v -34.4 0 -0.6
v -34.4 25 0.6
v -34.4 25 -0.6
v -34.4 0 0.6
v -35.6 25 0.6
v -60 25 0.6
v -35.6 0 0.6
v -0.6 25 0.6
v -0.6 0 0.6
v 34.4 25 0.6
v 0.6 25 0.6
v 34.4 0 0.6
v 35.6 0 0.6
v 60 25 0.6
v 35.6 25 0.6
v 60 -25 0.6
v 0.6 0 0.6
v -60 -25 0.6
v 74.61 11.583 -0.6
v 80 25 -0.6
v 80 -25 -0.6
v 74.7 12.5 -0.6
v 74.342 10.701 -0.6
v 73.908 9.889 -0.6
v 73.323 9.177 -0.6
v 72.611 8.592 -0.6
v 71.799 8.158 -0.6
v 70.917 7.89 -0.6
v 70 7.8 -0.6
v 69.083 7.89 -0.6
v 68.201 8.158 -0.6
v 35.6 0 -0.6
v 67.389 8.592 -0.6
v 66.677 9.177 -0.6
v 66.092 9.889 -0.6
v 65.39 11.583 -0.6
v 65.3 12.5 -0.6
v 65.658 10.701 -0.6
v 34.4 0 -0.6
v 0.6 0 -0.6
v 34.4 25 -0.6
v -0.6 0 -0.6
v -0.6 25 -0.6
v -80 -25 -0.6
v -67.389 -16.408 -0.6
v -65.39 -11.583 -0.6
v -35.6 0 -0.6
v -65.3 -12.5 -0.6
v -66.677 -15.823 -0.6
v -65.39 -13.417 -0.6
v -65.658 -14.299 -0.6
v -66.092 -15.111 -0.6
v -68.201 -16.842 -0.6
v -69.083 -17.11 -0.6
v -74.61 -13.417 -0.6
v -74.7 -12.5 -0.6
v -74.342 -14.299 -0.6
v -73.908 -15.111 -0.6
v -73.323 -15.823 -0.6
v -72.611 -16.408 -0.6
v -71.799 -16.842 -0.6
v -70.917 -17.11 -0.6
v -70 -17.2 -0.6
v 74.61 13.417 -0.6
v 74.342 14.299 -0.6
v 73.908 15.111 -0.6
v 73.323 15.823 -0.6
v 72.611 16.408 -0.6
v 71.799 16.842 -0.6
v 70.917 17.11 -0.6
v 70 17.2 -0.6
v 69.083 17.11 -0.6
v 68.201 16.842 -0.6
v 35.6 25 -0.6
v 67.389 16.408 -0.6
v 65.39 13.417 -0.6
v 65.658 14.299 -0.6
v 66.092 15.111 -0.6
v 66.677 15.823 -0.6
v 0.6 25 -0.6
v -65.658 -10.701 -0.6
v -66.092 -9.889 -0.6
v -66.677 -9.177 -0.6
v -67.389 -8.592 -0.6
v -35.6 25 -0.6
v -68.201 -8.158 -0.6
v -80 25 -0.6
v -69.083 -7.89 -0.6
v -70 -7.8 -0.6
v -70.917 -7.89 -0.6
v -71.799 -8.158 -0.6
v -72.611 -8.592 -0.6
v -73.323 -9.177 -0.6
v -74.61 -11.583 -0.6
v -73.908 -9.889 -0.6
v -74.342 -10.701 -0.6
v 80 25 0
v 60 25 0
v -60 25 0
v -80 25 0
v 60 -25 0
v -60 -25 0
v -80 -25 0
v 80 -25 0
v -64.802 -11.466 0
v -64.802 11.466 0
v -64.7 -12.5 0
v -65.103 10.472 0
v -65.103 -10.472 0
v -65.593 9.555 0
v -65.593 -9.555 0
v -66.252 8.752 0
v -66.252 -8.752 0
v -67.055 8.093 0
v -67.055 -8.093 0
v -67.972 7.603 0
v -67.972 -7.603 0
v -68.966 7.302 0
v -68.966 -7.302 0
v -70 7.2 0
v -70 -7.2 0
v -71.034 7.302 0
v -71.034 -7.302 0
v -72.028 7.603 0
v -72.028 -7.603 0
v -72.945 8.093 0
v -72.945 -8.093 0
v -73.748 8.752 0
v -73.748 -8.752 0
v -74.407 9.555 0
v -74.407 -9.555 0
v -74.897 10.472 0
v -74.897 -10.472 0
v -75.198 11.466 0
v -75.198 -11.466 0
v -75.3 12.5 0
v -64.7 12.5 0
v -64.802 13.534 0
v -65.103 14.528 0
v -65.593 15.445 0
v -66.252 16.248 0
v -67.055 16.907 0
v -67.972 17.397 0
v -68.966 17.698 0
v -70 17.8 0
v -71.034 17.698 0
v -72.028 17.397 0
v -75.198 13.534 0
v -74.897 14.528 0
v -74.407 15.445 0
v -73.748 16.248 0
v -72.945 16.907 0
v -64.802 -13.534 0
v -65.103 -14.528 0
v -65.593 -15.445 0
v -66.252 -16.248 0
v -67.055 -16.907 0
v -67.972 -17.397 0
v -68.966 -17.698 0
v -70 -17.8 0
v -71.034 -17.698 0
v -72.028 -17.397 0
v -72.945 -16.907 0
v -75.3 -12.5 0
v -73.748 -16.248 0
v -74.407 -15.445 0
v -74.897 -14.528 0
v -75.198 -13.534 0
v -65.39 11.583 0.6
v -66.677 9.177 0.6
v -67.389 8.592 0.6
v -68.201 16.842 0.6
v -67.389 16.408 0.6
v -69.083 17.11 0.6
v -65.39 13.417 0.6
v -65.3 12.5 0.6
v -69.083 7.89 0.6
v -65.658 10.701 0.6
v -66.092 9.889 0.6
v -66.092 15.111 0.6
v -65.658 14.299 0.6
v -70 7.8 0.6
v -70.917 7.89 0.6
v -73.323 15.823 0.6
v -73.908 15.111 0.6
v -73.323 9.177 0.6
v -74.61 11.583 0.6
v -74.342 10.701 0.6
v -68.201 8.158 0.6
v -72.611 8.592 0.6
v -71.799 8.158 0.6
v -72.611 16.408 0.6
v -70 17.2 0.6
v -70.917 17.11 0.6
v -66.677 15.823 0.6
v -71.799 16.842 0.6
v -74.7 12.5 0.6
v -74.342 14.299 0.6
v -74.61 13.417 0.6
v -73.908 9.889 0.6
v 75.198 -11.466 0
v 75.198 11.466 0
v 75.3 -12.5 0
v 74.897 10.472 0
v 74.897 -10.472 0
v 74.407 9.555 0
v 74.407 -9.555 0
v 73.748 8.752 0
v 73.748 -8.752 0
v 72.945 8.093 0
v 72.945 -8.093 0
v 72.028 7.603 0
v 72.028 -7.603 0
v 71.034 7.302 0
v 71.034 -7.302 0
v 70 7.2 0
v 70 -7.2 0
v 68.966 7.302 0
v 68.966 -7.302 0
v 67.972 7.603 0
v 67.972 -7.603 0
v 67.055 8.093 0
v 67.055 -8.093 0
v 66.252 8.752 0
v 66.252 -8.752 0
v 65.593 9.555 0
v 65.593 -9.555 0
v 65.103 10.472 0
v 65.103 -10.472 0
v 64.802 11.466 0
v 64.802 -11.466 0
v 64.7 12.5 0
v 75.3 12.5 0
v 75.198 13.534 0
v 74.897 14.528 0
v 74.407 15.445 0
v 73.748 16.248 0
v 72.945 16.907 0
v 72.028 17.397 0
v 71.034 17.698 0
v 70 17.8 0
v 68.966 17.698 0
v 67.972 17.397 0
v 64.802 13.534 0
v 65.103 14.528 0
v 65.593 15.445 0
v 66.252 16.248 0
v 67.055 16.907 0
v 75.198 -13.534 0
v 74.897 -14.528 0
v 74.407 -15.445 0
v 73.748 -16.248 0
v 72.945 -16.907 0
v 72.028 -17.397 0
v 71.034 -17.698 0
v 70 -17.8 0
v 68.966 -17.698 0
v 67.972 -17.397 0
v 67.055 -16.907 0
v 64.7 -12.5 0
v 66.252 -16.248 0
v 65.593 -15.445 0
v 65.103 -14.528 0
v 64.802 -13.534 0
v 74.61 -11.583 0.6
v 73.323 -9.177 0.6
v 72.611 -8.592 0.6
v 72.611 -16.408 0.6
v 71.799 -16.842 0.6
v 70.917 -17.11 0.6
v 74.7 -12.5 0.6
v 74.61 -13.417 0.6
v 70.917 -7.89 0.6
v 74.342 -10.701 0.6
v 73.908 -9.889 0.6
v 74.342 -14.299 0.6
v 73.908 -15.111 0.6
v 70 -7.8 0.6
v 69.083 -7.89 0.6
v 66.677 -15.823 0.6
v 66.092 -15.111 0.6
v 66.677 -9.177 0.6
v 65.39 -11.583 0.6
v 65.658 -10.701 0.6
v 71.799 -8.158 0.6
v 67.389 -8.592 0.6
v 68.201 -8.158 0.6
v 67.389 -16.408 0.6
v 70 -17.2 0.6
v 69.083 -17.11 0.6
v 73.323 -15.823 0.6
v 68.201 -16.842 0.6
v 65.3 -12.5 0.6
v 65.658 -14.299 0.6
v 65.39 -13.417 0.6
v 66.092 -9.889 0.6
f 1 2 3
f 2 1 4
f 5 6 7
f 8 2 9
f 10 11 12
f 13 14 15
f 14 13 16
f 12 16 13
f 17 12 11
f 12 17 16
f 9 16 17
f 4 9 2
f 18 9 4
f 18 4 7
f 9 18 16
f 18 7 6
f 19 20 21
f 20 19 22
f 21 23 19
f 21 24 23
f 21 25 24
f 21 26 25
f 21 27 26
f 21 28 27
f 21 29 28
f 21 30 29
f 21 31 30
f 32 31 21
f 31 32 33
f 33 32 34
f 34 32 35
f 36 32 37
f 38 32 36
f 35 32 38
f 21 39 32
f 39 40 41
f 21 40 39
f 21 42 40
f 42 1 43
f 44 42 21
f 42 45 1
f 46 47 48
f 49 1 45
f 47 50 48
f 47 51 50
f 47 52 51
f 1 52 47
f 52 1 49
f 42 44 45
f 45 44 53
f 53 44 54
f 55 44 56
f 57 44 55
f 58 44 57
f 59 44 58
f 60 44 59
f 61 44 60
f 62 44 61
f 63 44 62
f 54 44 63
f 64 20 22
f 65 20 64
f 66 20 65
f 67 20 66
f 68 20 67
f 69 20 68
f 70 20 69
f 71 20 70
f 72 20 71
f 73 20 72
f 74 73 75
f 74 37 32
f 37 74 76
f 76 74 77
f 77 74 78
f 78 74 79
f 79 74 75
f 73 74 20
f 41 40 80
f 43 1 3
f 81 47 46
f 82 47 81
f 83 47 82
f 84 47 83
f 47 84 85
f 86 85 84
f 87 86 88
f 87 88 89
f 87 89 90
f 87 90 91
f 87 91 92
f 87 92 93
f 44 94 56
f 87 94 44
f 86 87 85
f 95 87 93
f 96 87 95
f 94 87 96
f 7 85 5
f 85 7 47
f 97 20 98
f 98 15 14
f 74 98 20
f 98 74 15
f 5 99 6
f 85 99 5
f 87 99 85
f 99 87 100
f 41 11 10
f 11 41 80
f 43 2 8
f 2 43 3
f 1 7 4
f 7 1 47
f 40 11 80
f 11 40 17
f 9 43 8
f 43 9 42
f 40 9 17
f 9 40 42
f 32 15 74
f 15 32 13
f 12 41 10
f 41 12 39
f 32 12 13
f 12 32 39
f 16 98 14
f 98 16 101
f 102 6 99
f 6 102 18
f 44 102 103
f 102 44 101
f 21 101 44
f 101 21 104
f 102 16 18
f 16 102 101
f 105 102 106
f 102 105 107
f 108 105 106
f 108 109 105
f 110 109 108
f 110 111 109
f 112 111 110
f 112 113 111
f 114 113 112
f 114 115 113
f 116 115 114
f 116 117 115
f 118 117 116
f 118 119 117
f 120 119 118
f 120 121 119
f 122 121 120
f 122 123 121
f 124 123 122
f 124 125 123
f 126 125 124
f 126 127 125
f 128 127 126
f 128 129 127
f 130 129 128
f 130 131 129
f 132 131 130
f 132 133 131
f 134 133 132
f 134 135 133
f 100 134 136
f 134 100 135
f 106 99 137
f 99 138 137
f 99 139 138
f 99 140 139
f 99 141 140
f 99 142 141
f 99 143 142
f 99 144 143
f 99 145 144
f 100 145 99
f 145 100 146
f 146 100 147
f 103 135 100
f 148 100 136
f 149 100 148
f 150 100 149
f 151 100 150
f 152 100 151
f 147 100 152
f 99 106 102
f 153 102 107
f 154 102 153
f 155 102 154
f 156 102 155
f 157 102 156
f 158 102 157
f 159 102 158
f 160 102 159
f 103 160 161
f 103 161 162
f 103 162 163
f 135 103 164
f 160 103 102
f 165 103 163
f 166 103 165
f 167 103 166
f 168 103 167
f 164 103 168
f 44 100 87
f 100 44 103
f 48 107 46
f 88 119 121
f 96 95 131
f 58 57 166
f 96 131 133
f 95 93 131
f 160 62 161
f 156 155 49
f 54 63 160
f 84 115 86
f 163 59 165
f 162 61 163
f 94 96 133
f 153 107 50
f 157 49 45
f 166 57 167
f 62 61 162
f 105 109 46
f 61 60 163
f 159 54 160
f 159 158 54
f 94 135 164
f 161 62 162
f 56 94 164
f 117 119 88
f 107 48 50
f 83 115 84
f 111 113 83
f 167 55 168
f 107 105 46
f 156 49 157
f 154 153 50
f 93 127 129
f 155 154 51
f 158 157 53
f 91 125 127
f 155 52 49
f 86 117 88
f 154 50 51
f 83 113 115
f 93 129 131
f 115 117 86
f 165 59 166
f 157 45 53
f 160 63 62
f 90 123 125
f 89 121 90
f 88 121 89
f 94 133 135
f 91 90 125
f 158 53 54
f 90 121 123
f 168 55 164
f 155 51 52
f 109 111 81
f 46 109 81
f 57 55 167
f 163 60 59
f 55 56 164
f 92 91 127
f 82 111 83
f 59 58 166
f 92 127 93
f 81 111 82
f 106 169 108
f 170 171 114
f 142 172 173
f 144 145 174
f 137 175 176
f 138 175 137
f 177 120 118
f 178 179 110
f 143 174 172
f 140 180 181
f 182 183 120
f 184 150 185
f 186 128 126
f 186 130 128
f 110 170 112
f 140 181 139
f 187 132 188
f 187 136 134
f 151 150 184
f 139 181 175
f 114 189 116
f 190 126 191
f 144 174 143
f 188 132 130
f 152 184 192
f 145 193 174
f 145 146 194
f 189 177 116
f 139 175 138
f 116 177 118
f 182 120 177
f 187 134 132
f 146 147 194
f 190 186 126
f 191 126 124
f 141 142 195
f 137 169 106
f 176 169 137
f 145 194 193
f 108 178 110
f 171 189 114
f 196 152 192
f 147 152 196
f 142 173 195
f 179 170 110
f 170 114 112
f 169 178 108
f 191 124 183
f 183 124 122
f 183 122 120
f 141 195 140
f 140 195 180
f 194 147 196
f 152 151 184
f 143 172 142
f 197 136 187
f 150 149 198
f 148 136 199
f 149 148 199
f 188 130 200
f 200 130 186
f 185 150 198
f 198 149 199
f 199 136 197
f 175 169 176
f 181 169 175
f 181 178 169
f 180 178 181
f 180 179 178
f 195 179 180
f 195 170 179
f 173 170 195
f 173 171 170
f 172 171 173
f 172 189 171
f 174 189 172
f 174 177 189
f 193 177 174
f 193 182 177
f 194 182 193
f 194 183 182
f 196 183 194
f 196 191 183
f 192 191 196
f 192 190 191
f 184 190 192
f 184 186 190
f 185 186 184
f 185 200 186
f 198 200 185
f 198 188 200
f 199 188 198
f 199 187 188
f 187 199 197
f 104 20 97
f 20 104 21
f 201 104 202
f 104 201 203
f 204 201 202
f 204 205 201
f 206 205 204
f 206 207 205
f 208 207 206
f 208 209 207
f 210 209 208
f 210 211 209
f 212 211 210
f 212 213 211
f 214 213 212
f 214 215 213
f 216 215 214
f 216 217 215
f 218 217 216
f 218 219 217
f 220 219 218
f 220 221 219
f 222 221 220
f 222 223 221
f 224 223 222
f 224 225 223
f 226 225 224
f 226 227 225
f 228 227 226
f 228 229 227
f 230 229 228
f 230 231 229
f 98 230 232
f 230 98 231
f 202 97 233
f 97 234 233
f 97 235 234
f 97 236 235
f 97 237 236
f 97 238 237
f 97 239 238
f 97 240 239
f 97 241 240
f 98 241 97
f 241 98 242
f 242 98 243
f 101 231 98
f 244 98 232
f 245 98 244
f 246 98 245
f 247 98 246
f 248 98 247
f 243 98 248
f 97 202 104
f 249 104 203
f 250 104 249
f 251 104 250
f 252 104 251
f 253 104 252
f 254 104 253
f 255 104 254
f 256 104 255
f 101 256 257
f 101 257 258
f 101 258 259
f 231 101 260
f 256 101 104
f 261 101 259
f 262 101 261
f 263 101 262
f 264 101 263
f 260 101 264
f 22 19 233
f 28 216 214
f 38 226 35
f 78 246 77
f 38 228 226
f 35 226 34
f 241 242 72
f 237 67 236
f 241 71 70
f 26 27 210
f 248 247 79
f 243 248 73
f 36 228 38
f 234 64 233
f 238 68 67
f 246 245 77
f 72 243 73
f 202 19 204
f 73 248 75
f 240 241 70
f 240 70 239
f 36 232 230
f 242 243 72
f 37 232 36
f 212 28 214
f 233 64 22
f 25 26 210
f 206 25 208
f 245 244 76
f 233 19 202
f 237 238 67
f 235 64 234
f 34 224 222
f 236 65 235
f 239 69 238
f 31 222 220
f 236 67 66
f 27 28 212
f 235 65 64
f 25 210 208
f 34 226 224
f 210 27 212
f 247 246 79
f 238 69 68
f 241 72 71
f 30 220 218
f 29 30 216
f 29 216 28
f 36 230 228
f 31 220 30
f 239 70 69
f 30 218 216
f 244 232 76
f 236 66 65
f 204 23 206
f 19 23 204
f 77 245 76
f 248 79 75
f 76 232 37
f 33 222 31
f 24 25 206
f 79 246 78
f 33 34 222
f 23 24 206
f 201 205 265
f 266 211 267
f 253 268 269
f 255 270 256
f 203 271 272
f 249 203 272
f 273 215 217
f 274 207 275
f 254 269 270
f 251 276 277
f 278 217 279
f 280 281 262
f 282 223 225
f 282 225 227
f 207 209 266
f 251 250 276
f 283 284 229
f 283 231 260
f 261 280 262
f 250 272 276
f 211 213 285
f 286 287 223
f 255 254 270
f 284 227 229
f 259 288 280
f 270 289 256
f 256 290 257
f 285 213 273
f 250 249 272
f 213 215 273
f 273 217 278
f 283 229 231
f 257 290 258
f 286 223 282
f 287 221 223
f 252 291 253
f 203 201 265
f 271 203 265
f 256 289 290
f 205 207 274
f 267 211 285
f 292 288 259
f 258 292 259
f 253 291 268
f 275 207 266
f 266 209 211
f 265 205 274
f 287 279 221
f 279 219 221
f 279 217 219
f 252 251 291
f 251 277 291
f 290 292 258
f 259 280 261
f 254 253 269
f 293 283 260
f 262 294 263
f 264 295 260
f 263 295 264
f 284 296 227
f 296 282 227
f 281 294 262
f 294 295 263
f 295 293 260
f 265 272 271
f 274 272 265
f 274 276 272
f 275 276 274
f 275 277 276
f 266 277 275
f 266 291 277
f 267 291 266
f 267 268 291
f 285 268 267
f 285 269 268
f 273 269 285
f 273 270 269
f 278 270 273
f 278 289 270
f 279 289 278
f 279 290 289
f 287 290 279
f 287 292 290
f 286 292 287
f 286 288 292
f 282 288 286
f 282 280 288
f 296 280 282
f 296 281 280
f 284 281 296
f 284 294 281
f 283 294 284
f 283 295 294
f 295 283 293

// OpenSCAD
//!OpenSCAD

//The length of the divider
Divider_Length = 140;
//Wether to create a linear connector on the left/top end
Left_Top_Connector = true;
//Wether to invert the left/top connector
Left_Top_Connector_Inverted = false;
//Wether to create a linear connector on the right/bottom end
Right_Bottom_Connector = true;
//Wether to invert the right/bottom connector
Right_Bottom_Connector_Inverted = true;
//The positions to create a slit of Divider_Thickness width for perpendicular connections at
Positions_Connectors = [35, 70, 105];

//The height of the divider
Divider_Height = 50;
//The thickness of the divider (Should give an even number if diveded by layer height)
Divider_Thickness = 1.2;
//The length of overlap regions for connecting
Overlap_Length = 20;
//The diameter of the holes and knobs for connecting (Sould be smaller than Overlap_Length
Diameter_Connectors = 10;
//The amount of connectors per overlap region (Must be smaller than Divider_Height divided by Diameter_Connectors
Amount_Connectors = 2;
//Wether to ignore problems that could result in a failing print
Ignore_Problems = false;

//Circle Resolution
$fn = 32;

//Internal Calculations
Reduced_Divider_Length = Divider_Length - (Left_Top_Connector ? Overlap_Length / 2 : 0) - (Right_Bottom_Connector ? Overlap_Length / 2 : 0);
Left_Top_Offset = Left_Top_Connector ? Overlap_Length / 2 : 0;

if (!Ignore_Problems
    && (   (Overlap_Length < Diameter_Connectors)
        || ((Divider_Height / Diameter_Connectors) < Amount_Connectors)
        )
    )
    translate([0, Divider_Height, 0])
        text("Warning! Print might not give a good result", halign="center", valign="center");
difference() {
    cube([Reduced_Divider_Length, Divider_Height, Divider_Thickness], center=true);
    
    for (x = Positions_Connectors)
        translate([-Reduced_Divider_Length/2+x-Left_Top_Offset, Divider_Height/4, 0])
            cube([Divider_Thickness, Divider_Height/2, Divider_Thickness], center=true);
}

if (Left_Top_Connector) {
    translate([-(Reduced_Divider_Length+Overlap_Length)/2, 0, 0]) {
        if (Left_Top_Connector_Inverted)
            mirror([0,0,1])
                Connector();
        else
            Connector();
    }
}

if (Right_Bottom_Connector) {
    translate([(Reduced_Divider_Length+Overlap_Length)/2, 0, 0]) {
        rotate([180,0,0]) {
            if (Right_Bottom_Connector_Inverted)
                mirror([0,0,1])
                    Connector();
            else
                Connector();
        }
    }
}

module Connector() {
    union(){
        difference(){
            translate([0, 0, -Divider_Thickness/4])
                cube([Overlap_Length, Divider_Height, Divider_Thickness/2], center=true);
            
            for (i = [0 : 2 : Amount_Connectors - 1])
                translate([0, -Divider_Height/2 + ((i+0.5)*Divider_Height/Amount_Connectors), -Divider_Thickness/4])
                    cylinder(h=Divider_Thickness/2, r1=(Diameter_Connectors-Divider_Thickness/2)/2, r2=(Diameter_Connectors+Divider_Thickness/2)/2, center=true);
        }
        
        for (i = [1 : 2 : Amount_Connectors - 1])
                translate([0, -Divider_Height/2 + ((i+0.5)*Divider_Height/Amount_Connectors), Divider_Thickness/4])
                    cylinder(h=Divider_Thickness/2, r1=(Diameter_Connectors+Divider_Thickness/2)/2, r2=(Diameter_Connectors-Divider_Thickness/2)/2, center=true);
    }
}
